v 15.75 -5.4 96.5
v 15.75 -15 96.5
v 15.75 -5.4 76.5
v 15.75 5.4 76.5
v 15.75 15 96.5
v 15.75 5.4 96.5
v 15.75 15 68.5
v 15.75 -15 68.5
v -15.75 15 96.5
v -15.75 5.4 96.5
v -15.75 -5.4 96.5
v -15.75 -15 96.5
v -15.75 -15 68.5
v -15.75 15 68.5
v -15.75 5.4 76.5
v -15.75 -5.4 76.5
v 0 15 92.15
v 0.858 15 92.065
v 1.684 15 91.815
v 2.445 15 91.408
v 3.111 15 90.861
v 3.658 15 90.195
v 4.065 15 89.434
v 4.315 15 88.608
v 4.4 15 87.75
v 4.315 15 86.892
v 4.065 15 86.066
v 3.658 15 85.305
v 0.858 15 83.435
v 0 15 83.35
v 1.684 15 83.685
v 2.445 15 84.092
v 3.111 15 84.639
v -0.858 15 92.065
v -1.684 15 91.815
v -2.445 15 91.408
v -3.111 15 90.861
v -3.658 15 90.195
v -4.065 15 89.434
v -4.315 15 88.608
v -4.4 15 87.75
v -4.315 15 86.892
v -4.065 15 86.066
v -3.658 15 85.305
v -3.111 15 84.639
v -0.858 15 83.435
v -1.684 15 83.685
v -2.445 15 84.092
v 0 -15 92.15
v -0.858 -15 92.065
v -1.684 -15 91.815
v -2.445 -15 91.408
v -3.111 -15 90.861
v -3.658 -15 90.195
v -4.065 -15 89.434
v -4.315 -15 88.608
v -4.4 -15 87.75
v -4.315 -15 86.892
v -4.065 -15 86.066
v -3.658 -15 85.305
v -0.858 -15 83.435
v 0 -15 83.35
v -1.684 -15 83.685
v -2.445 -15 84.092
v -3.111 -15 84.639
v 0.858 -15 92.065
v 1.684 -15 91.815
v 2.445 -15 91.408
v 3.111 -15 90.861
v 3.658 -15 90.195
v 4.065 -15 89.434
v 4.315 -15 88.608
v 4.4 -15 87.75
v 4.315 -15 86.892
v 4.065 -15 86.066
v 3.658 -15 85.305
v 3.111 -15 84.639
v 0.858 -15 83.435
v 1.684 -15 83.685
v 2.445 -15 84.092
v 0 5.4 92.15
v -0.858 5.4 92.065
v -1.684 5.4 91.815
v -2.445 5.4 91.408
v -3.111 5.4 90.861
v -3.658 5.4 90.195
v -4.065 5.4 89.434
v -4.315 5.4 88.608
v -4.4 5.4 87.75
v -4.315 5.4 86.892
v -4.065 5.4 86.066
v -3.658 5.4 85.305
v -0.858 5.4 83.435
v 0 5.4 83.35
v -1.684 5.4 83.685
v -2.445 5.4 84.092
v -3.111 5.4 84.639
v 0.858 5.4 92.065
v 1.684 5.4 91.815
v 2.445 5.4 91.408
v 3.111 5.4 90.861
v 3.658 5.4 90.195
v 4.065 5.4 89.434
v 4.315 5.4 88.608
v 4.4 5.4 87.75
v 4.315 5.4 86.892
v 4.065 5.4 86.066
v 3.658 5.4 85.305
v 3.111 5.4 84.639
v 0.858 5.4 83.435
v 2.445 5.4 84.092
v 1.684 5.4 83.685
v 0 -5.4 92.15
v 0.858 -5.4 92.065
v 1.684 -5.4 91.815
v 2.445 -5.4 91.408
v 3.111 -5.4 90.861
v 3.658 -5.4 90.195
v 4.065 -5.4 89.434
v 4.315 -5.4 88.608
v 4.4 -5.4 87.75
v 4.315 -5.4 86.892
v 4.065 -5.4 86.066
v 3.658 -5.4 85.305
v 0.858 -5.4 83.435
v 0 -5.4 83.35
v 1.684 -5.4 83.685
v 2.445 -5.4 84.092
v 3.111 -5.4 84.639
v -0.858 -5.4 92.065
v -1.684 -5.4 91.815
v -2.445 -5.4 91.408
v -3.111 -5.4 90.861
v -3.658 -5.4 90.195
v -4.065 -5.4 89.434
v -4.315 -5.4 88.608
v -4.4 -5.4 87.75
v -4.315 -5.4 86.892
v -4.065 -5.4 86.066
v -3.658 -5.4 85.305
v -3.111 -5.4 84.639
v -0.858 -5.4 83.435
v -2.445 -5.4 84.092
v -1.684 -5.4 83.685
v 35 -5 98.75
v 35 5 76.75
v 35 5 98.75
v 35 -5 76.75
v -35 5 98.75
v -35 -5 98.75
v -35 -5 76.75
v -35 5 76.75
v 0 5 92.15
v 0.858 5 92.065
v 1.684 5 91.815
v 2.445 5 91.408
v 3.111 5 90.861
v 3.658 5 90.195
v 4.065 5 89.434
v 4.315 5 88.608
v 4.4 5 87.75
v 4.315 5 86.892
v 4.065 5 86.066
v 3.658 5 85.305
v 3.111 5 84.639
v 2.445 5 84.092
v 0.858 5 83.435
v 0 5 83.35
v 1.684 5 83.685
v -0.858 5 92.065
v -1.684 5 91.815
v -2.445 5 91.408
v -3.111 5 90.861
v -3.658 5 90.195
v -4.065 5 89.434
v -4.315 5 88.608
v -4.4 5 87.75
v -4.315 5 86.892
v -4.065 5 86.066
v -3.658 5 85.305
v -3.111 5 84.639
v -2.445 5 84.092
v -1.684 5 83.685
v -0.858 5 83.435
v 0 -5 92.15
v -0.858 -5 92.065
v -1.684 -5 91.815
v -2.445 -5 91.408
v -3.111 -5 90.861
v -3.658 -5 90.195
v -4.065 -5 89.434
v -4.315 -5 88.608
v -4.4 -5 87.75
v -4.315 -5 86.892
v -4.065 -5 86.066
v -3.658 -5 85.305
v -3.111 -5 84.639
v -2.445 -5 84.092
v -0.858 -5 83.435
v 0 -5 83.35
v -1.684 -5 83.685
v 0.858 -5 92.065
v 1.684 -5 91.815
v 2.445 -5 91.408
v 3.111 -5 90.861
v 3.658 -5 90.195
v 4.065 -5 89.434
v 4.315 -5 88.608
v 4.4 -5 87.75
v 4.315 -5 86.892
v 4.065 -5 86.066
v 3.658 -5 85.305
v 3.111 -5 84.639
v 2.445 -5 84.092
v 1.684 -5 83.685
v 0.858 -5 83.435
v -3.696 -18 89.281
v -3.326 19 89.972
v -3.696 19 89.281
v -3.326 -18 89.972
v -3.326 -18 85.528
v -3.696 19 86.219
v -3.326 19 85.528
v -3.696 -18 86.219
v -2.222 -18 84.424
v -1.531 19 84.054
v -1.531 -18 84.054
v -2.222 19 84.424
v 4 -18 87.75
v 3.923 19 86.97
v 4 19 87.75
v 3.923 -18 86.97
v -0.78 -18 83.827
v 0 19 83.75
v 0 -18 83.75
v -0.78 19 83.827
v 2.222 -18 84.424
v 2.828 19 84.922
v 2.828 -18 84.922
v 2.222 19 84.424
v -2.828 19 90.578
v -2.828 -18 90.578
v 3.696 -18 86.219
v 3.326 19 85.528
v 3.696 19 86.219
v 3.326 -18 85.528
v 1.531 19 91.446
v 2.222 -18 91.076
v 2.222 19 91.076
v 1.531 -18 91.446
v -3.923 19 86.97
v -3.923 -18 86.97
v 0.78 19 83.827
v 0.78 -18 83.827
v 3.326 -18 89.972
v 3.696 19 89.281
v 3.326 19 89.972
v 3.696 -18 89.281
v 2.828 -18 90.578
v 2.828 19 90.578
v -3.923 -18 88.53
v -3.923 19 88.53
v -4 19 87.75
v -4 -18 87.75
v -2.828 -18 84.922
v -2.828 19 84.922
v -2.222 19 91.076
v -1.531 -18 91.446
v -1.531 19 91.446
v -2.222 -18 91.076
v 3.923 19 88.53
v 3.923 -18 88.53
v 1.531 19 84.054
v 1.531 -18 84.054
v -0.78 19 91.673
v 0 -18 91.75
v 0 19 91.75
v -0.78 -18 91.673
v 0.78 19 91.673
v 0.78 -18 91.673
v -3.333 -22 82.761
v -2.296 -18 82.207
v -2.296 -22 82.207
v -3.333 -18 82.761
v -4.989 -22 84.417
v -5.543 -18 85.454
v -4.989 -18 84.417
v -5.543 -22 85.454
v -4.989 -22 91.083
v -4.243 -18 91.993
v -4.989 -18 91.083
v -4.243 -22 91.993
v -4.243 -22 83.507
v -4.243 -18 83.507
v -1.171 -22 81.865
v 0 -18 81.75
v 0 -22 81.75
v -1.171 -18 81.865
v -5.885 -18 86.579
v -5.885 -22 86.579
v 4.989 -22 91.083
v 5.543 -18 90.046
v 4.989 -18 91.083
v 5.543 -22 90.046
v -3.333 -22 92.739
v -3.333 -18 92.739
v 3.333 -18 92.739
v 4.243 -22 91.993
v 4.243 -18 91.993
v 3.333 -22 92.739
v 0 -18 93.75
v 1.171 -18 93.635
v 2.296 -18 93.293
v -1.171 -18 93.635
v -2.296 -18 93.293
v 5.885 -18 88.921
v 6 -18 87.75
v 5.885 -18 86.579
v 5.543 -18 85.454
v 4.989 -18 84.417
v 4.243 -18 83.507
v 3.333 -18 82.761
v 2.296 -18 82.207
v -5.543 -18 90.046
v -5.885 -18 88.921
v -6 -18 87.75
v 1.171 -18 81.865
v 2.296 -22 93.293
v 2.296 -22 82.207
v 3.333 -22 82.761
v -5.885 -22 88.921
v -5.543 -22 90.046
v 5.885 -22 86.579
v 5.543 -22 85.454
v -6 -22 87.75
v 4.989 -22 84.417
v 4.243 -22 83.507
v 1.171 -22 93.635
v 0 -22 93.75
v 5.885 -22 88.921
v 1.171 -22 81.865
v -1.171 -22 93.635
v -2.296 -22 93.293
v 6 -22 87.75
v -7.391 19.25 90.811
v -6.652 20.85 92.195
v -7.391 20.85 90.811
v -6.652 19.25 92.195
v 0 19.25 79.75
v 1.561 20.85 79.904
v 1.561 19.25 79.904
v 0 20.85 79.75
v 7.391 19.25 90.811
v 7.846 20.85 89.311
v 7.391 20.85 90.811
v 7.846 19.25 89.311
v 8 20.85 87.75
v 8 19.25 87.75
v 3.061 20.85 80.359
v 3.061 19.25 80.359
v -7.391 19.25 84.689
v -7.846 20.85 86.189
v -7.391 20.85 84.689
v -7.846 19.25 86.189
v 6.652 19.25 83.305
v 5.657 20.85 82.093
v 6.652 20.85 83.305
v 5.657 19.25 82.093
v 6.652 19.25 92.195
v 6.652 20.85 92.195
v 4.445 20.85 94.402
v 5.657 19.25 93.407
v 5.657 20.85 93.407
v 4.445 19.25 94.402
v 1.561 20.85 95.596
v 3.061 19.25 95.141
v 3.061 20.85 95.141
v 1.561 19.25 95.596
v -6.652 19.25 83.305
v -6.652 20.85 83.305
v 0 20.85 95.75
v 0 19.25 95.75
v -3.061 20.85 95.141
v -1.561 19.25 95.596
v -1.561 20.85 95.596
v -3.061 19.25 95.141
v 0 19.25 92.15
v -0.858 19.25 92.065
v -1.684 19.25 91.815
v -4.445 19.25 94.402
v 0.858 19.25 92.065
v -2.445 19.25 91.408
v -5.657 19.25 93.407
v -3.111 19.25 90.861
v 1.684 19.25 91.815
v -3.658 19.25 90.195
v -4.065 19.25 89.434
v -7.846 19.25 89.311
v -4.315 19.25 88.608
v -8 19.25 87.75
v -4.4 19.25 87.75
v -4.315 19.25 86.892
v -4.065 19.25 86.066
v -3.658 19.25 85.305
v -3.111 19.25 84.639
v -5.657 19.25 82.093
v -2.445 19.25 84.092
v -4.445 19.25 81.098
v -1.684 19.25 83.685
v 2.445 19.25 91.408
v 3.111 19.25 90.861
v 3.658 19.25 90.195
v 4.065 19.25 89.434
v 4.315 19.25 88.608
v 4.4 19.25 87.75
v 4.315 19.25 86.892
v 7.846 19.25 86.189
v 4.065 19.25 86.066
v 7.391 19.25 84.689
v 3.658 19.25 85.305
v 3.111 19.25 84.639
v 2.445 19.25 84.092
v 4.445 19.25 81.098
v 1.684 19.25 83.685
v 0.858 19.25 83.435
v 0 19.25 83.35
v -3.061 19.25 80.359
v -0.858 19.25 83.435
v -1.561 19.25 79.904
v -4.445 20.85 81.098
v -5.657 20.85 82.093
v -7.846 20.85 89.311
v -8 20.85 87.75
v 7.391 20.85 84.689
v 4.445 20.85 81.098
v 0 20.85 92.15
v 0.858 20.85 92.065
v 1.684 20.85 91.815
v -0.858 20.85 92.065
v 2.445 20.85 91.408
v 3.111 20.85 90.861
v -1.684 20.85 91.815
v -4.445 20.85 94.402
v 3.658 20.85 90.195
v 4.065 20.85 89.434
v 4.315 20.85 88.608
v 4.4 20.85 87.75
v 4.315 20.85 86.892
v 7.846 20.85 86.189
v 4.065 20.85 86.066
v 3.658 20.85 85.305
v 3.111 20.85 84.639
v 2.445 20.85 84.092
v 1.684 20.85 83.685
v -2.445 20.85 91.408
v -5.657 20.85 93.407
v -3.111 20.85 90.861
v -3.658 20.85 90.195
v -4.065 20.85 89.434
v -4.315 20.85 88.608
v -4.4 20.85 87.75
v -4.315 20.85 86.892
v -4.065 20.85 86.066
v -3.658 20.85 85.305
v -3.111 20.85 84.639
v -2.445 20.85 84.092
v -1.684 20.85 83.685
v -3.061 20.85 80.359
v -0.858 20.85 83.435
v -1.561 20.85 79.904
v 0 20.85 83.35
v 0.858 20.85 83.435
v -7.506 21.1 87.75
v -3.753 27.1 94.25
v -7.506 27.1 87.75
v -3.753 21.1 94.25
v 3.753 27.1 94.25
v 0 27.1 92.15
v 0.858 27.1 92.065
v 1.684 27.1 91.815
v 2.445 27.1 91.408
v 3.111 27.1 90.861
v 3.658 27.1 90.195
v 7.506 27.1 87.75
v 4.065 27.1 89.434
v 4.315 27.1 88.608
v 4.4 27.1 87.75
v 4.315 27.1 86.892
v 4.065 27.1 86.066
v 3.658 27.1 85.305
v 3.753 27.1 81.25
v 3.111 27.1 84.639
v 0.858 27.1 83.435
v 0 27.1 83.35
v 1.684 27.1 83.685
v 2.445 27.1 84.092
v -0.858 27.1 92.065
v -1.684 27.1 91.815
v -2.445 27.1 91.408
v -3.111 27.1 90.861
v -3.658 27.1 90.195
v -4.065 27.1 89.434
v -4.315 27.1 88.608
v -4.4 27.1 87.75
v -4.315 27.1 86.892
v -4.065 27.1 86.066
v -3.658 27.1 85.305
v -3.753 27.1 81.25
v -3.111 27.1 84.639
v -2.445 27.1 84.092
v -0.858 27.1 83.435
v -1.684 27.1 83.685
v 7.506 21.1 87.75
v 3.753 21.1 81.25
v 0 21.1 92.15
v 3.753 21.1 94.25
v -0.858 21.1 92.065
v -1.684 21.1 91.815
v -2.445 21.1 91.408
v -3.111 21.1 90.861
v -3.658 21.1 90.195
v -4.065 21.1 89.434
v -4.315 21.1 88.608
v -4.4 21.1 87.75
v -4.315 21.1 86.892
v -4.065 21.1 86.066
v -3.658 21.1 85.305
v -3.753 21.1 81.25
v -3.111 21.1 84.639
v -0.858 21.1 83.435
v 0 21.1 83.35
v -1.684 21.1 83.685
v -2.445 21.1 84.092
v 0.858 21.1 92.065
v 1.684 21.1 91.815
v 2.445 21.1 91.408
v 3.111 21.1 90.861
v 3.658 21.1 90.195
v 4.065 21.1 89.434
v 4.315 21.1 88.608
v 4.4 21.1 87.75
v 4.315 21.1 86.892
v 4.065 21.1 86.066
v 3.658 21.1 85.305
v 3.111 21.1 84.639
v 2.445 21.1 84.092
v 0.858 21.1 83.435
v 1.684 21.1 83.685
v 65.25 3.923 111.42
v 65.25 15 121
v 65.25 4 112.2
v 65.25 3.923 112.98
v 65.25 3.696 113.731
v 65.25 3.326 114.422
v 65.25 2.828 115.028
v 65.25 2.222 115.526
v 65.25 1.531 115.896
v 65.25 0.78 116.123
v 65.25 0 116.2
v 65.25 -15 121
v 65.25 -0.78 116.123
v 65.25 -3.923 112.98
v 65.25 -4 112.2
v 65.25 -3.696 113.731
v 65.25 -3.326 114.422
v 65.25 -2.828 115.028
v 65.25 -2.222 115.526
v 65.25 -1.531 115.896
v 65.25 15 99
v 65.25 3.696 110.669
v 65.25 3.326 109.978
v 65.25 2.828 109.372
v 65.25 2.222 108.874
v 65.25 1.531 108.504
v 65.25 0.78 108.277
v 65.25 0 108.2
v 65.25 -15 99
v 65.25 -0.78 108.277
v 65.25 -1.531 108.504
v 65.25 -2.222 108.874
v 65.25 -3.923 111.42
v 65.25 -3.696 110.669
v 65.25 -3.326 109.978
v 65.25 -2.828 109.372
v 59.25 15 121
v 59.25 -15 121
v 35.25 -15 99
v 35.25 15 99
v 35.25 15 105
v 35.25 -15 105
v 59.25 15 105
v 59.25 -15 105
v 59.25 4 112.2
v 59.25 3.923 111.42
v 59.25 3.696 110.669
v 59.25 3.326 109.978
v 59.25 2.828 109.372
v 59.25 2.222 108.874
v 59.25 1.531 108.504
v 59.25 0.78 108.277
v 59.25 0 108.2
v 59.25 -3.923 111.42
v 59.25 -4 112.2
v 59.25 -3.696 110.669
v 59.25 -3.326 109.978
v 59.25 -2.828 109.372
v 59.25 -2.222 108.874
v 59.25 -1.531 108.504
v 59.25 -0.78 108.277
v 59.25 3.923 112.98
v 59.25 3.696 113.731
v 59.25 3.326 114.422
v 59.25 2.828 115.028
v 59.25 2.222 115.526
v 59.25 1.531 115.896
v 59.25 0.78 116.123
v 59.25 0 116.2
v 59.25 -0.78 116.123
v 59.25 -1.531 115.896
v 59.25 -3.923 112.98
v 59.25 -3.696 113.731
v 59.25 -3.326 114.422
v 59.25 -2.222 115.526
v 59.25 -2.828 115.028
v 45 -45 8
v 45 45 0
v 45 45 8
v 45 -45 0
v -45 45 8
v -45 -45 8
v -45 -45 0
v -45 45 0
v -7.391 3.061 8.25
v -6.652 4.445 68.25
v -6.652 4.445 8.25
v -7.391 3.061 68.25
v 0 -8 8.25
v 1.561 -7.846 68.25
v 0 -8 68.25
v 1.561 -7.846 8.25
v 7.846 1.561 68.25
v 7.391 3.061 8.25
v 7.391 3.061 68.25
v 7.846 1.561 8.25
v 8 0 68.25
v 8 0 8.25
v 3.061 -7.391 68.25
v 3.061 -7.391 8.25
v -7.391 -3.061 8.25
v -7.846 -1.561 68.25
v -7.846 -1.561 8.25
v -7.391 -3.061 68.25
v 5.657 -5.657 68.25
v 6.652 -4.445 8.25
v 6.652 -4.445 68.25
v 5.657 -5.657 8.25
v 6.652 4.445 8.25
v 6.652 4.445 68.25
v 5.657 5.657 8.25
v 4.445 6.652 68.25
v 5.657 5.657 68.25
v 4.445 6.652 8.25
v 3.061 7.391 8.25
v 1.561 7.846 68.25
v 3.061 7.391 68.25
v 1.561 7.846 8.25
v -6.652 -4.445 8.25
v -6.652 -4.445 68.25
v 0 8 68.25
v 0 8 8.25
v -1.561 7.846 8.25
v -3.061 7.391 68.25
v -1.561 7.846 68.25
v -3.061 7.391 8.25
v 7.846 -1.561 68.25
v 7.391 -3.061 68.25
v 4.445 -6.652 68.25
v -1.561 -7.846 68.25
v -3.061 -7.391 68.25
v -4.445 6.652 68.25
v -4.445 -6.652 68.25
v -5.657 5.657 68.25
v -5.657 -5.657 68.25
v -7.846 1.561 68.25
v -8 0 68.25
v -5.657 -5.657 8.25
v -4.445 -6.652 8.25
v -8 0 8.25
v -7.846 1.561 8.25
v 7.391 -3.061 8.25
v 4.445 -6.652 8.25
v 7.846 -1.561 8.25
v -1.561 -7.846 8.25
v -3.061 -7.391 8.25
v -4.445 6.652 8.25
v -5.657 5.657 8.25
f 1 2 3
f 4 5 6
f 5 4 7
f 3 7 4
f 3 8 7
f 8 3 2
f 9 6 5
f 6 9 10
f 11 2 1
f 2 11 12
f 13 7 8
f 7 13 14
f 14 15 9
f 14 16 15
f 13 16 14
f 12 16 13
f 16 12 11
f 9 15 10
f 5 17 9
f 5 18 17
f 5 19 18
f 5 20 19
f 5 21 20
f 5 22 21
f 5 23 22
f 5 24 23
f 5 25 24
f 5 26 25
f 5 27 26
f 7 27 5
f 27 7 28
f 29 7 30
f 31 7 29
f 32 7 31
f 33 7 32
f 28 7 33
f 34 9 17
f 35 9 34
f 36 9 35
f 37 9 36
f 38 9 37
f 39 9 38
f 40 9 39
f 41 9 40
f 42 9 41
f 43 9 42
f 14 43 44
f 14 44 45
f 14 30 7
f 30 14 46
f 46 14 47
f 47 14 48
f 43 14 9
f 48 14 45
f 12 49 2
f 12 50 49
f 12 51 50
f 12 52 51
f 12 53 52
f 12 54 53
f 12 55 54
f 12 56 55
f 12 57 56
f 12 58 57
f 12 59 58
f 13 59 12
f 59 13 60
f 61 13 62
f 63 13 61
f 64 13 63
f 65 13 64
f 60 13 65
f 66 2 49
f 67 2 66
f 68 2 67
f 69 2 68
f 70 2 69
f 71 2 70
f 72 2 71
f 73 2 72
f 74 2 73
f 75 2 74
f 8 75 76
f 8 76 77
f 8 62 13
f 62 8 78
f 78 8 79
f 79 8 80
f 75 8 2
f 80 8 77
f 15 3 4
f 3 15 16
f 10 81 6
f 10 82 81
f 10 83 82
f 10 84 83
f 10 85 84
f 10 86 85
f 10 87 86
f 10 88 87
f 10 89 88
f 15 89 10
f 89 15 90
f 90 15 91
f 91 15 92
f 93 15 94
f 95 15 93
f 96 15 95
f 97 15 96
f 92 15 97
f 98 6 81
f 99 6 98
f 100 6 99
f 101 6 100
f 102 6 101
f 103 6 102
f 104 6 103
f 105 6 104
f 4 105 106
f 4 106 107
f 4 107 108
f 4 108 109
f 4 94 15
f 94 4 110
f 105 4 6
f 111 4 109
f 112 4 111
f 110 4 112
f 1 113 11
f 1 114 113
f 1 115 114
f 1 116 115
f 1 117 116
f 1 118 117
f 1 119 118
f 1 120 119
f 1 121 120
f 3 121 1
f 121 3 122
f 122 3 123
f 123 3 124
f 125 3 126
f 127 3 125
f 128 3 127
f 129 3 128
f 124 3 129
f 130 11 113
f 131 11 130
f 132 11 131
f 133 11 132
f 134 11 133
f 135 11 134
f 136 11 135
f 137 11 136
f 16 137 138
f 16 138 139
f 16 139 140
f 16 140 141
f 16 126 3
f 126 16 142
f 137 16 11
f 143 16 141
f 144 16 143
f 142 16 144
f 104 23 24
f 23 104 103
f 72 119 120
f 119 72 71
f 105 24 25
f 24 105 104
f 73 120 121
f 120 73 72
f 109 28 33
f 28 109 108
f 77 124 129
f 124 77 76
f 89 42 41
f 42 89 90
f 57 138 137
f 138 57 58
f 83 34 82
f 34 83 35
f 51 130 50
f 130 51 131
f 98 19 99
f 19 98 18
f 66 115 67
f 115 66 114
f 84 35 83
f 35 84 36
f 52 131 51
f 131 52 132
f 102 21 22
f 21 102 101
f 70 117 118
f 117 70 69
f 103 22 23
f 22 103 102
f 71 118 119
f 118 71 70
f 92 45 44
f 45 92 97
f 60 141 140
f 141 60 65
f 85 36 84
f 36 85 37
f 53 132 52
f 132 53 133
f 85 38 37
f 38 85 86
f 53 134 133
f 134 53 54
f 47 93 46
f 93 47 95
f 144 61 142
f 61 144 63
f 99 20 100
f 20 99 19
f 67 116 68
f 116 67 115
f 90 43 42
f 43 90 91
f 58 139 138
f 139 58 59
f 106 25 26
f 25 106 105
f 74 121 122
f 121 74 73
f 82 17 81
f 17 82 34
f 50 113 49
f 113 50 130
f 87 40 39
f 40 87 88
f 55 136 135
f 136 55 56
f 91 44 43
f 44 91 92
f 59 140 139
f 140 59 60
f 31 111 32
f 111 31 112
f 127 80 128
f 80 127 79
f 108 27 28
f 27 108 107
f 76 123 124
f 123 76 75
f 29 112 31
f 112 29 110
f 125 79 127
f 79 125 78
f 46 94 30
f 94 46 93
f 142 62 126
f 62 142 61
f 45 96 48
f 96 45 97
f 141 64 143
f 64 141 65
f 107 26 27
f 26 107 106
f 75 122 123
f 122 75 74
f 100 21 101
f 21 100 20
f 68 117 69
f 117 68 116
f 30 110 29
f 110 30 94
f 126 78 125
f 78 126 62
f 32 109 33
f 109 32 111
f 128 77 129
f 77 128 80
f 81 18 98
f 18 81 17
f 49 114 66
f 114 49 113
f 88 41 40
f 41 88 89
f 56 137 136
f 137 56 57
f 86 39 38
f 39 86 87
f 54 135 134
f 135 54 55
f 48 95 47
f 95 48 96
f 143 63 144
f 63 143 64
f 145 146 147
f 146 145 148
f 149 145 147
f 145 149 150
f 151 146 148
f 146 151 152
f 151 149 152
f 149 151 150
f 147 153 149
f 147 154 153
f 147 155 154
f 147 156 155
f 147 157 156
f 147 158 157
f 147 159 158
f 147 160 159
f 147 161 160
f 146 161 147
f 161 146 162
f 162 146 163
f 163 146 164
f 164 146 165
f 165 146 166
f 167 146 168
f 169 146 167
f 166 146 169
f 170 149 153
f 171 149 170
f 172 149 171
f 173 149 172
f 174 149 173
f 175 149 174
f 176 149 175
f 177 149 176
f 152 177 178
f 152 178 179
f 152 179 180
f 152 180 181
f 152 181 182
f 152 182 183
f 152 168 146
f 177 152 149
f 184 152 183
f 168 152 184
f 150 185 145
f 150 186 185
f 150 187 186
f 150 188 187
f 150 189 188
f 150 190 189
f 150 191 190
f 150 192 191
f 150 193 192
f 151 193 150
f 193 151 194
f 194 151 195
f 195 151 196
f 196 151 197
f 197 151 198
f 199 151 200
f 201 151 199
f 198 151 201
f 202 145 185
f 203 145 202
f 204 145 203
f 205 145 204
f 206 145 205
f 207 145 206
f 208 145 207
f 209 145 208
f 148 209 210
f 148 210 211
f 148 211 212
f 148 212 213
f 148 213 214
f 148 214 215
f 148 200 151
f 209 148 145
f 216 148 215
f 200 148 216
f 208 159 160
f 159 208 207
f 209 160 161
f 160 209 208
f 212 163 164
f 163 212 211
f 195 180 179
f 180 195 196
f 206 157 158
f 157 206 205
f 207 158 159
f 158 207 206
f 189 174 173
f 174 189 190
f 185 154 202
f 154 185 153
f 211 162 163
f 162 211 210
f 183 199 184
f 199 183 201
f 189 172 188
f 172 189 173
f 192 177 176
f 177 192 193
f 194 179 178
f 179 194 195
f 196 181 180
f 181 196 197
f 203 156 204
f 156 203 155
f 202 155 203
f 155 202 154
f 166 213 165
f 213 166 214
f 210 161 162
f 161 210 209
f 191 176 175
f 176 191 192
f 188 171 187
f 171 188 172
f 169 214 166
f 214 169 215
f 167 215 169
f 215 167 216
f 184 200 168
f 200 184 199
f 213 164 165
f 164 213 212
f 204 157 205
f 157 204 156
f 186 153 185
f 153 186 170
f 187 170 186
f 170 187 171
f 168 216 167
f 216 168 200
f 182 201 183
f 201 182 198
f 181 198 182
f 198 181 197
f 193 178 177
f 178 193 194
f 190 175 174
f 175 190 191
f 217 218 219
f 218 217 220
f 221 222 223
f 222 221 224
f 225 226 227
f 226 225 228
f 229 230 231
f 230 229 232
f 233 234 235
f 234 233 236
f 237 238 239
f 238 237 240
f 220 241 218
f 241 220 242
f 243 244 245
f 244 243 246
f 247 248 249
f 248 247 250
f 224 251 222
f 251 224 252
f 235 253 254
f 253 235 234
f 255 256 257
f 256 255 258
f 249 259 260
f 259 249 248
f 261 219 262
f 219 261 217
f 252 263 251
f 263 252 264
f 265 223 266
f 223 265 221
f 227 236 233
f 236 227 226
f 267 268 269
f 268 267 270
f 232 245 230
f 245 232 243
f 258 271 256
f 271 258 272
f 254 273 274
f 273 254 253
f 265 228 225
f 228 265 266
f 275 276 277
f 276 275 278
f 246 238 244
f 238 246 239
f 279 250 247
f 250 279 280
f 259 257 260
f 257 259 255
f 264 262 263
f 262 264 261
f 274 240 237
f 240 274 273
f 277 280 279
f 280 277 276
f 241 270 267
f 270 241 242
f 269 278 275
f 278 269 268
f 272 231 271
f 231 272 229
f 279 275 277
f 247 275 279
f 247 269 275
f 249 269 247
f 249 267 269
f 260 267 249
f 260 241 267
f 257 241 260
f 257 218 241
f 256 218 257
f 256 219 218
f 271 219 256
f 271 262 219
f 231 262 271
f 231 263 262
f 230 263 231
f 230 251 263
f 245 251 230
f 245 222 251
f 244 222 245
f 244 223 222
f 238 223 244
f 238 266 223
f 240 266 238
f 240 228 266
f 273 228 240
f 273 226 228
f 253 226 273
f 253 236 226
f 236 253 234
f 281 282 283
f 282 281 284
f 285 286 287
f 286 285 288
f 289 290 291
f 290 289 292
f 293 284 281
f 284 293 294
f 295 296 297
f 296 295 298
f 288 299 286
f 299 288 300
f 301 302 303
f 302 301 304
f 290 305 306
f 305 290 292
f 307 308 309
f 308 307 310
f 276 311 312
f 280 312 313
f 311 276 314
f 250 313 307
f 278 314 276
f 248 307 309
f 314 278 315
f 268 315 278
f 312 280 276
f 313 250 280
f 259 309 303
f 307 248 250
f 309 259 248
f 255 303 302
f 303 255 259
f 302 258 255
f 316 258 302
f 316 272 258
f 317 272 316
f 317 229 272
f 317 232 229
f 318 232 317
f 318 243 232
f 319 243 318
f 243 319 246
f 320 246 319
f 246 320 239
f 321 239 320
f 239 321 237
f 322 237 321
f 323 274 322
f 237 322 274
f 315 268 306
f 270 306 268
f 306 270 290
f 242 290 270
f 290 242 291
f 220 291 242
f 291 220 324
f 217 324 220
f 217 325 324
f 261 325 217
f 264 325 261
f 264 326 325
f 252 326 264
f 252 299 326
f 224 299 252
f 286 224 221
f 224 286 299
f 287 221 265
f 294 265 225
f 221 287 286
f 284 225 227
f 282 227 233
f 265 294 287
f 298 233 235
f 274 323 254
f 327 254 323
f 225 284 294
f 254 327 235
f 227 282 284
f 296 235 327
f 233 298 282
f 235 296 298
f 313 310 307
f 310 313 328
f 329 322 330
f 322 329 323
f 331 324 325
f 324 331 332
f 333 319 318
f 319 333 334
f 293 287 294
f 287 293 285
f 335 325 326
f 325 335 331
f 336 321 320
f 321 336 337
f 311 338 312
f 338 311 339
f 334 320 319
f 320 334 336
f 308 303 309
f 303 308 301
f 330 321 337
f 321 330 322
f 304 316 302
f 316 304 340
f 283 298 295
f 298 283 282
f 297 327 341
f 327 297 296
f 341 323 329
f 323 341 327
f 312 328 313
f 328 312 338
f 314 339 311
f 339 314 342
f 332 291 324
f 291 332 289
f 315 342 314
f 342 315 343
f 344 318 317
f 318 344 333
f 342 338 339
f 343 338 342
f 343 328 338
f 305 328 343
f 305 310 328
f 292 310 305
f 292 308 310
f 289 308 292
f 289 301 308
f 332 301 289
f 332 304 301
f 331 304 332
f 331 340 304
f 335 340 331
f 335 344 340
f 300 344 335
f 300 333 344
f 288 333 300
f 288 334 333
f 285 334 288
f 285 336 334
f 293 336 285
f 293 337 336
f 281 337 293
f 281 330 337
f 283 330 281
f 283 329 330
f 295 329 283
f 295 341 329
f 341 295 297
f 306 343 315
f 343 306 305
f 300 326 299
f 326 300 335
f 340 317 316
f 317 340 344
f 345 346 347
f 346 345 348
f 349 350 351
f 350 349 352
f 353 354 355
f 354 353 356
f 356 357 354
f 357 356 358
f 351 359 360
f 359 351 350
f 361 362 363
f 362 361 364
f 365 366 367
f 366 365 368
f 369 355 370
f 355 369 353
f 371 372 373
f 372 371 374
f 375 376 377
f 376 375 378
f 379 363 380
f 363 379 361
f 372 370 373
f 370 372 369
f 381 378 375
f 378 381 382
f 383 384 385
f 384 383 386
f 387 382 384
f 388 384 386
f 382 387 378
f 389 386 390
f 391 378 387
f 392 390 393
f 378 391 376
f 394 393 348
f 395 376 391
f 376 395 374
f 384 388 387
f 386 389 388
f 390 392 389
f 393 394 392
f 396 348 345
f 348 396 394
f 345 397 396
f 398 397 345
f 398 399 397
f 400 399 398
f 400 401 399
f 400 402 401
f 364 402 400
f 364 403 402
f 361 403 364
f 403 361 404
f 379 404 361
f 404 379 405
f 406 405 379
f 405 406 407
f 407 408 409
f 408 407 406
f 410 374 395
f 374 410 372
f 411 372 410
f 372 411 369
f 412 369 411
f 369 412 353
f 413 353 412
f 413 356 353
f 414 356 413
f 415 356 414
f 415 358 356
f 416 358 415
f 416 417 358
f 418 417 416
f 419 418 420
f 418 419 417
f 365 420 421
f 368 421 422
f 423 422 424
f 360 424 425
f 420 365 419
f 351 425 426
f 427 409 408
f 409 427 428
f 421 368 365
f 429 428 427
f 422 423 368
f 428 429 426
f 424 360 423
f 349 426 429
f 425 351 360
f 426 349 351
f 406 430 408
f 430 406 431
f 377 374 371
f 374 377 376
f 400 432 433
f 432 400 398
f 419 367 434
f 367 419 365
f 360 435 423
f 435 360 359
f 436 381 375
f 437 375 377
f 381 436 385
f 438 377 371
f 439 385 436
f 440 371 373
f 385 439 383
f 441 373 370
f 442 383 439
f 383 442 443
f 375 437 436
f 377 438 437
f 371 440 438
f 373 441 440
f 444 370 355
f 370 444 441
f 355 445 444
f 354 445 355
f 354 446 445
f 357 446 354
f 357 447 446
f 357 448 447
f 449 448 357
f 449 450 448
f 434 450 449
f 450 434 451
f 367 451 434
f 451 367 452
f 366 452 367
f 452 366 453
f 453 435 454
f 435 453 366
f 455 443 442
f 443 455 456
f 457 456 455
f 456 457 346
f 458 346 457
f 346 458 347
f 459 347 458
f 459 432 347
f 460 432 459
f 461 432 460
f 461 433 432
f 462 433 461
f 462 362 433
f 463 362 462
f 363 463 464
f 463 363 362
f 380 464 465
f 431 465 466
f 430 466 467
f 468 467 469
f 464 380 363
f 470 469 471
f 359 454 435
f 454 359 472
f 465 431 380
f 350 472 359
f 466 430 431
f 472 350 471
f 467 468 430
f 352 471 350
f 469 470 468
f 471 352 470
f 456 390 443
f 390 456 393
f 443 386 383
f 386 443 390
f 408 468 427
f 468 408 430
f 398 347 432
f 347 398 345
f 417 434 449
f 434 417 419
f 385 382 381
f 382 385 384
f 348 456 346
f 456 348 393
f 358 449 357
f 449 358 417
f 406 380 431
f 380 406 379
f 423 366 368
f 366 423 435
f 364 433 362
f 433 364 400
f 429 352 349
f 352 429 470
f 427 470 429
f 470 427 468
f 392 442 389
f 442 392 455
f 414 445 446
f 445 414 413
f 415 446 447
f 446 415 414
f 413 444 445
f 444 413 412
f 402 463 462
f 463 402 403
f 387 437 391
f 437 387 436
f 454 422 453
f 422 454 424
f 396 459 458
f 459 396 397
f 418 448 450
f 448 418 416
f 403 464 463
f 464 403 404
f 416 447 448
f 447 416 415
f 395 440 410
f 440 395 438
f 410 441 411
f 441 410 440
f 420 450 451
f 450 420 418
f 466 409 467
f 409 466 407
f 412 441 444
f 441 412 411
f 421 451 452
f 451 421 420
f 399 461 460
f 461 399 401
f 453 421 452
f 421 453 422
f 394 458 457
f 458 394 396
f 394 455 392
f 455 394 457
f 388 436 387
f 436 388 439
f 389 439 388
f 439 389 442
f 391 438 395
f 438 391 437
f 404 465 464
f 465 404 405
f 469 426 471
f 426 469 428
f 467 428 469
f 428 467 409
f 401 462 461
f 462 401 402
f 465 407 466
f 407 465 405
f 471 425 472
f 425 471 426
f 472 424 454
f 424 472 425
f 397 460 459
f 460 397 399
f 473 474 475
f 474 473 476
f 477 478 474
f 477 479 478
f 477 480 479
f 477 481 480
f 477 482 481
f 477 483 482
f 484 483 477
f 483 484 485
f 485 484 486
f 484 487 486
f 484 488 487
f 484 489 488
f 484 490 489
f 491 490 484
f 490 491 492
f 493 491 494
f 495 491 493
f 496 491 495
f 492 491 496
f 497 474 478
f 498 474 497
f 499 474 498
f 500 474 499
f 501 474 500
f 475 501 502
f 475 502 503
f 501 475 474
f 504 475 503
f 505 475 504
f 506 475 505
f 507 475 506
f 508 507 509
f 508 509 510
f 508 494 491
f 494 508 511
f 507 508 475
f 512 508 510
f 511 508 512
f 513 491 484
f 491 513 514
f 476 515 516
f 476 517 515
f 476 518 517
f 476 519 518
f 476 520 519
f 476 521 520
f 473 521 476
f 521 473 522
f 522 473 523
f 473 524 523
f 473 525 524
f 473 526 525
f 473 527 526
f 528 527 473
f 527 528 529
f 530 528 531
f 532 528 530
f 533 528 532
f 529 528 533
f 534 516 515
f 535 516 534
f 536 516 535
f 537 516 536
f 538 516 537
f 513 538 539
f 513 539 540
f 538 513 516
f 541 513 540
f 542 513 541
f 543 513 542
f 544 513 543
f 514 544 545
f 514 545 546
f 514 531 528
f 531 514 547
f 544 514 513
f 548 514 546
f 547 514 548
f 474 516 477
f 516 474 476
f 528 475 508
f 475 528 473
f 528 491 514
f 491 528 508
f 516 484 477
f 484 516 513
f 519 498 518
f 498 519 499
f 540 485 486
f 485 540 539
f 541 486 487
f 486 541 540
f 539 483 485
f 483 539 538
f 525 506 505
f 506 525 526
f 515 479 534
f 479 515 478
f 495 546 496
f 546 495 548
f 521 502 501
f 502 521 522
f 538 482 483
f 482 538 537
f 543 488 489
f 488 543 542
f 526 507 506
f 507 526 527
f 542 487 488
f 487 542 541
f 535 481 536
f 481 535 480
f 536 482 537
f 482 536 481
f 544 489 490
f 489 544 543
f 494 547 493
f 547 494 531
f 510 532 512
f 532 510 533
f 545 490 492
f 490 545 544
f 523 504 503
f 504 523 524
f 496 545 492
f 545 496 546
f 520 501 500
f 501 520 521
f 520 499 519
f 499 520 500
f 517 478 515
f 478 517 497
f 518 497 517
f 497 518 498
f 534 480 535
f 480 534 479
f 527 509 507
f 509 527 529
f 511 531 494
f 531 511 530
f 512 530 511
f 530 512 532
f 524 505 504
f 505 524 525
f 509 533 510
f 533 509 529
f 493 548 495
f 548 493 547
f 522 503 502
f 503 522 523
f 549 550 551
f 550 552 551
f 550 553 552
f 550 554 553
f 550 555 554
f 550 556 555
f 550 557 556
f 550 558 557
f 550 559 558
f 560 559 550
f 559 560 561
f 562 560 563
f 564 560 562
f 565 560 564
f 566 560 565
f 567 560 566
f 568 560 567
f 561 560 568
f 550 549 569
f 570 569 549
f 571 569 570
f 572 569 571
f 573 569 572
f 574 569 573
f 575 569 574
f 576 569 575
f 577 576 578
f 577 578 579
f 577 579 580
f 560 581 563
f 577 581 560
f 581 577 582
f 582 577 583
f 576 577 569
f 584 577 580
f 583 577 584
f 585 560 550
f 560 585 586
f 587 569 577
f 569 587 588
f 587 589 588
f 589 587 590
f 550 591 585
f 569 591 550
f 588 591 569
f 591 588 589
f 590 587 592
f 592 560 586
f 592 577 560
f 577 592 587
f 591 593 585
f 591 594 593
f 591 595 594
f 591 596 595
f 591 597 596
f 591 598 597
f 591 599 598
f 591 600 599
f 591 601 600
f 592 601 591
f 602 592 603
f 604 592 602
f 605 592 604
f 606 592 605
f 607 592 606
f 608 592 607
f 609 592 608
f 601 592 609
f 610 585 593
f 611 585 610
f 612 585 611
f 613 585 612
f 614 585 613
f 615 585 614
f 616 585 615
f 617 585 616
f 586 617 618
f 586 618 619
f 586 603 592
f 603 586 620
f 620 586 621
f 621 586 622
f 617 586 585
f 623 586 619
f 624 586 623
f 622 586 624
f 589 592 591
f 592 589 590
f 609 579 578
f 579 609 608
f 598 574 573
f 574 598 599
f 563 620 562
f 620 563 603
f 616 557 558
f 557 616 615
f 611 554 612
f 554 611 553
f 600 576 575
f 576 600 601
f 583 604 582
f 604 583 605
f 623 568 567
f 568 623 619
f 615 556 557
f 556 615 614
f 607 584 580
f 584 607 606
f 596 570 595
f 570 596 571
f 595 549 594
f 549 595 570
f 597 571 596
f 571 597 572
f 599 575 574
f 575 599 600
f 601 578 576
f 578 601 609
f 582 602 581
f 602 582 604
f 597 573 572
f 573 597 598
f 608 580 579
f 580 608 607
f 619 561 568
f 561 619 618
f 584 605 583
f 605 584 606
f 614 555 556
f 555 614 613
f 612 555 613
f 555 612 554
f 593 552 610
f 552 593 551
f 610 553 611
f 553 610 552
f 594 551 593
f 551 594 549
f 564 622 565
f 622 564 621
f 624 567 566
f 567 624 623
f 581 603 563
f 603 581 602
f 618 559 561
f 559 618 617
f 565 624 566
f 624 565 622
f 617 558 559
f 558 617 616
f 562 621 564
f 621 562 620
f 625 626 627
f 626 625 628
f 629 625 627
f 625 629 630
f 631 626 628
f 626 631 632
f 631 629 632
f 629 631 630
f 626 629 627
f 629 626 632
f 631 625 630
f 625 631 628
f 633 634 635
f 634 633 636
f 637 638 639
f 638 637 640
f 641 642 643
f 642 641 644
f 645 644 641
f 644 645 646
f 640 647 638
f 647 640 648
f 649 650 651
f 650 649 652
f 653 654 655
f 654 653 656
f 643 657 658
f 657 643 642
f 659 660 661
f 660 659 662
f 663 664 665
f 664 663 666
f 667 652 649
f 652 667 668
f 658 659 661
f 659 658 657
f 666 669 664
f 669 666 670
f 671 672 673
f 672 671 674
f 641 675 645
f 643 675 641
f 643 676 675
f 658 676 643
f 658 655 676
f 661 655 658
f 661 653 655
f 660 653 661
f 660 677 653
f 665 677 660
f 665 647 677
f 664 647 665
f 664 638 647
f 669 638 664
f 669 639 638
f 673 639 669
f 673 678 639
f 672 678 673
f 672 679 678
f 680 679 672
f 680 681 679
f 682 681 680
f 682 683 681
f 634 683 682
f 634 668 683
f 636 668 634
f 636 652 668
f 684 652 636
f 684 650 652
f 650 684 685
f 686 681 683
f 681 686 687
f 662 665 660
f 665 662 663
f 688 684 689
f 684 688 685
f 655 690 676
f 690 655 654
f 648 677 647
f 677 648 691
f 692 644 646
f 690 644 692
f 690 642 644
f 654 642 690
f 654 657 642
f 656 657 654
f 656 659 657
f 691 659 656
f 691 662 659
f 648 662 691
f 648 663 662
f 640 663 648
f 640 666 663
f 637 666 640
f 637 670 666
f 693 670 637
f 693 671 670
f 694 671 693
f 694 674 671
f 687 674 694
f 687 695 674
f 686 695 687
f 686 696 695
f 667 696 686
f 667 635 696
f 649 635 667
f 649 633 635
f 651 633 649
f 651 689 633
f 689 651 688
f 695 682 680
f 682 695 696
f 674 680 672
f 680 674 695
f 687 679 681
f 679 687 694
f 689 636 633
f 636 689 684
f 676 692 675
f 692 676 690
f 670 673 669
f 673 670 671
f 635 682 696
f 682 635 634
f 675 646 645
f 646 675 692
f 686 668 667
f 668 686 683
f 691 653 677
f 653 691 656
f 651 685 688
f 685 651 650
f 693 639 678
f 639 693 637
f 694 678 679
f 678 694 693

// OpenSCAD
$fn = 32;

// ------------------------------------------------------------------------
// Lamp arm: column d16 x 60 mm, arm 70 mm
// Every part is its own module, assembly() places every instance.
// ------------------------------------------------------------------------

// --- part 1 ---
module lamp_base() {
  difference() {
    translate([-45, -45, 0]) cube([90, 90, 8]);
  }
}

// --- part 2 ---
module lamp_column() {
  cylinder(h = 60, d = 16);
}

// --- part 3 ---
module head_fork() {
  difference() {
    translate([-15.75, -15, 0]) cube([31.5, 30, 28]);
    translate([-16.75, -5.4, 8]) cube([33.5, 10.8, 21]);
    translate([0, 0, 19.25]) rotate([90, 0, 0]) cylinder(h = 32, d = 8.8, center = true);
  }
}

// --- part 4 ---
module lamp_arm() {
  difference() {
    translate([-35, -5, 0]) cube([70, 10, 22]);
    translate([0, 0, 11]) rotate([90, 0, 0]) cylinder(h = 12, d = 8.8, center = true);
  }
}

// --- part 5 ---
module arm_pin() {
  rotate([0, 90, 0]) cylinder(h = 38, d = 8, center = true);
  translate([-22, 0, 0]) rotate([0, 90, 0]) cylinder(h = 4, d = 12);
}

// --- part 6 ---
module arm_washer() {
  difference() {
      translate([0, 0, 0]) cylinder(h = 1.6, d = 16);
      translate([0, 0, -1]) cylinder(h = 3.6, d = 8.8);
    }
}

// --- part 7 ---
module arm_nut() {
  difference() {
    linear_extrude(height = 6) polygon(points = [[7.506, 0], [3.753, 6.5], [-3.753, 6.5], [-7.506, 0], [-3.753, -6.5], [3.753, -6.5]]);
    translate([0, 0, -1]) cylinder(h = 8, d = 8.8);
  }
}

// --- part 8 ---
module shade_bracket() {
  difference() {
    translate([-15, -15, 0]) cube([30, 30, 22]);
    translate([-16, -16, 6]) cube([25, 32, 17]);
    translate([12, 0, 13.2]) rotate([0, 90, 0]) cylinder(h = 8, d = 8, center = true);
  }
}

// --- assembly ---
module assembly() {
  color([0.80, 0.24, 0.20]) translate([0, 0, 0]) rotate([0, 0, 0]) lamp_base();
  color([0.20, 0.45, 0.75]) translate([0, 0, 8.25]) rotate([0, 0, 0]) lamp_column();
  color([0.25, 0.62, 0.32]) translate([0, 0, 68.5]) rotate([0, 0, 0]) head_fork();
  color([0.92, 0.70, 0.18]) translate([0, 0, 76.75]) rotate([0, 0, 0]) lamp_arm();
  color([0.58, 0.35, 0.70]) translate([0, 0, 87.75]) rotate([0, 0, 90]) arm_pin();
  color([0.16, 0.66, 0.66]) translate([0, 20.85, 87.75]) rotate([90, 0, 0]) arm_washer();
  color([0.85, 0.48, 0.18]) translate([0, 27.1, 87.75]) rotate([90, 0, 0]) arm_nut();
  color([0.55, 0.60, 0.65]) translate([50.25, 0, 99]) rotate([0, 0, 0]) shade_bracket();
}

assembly();
